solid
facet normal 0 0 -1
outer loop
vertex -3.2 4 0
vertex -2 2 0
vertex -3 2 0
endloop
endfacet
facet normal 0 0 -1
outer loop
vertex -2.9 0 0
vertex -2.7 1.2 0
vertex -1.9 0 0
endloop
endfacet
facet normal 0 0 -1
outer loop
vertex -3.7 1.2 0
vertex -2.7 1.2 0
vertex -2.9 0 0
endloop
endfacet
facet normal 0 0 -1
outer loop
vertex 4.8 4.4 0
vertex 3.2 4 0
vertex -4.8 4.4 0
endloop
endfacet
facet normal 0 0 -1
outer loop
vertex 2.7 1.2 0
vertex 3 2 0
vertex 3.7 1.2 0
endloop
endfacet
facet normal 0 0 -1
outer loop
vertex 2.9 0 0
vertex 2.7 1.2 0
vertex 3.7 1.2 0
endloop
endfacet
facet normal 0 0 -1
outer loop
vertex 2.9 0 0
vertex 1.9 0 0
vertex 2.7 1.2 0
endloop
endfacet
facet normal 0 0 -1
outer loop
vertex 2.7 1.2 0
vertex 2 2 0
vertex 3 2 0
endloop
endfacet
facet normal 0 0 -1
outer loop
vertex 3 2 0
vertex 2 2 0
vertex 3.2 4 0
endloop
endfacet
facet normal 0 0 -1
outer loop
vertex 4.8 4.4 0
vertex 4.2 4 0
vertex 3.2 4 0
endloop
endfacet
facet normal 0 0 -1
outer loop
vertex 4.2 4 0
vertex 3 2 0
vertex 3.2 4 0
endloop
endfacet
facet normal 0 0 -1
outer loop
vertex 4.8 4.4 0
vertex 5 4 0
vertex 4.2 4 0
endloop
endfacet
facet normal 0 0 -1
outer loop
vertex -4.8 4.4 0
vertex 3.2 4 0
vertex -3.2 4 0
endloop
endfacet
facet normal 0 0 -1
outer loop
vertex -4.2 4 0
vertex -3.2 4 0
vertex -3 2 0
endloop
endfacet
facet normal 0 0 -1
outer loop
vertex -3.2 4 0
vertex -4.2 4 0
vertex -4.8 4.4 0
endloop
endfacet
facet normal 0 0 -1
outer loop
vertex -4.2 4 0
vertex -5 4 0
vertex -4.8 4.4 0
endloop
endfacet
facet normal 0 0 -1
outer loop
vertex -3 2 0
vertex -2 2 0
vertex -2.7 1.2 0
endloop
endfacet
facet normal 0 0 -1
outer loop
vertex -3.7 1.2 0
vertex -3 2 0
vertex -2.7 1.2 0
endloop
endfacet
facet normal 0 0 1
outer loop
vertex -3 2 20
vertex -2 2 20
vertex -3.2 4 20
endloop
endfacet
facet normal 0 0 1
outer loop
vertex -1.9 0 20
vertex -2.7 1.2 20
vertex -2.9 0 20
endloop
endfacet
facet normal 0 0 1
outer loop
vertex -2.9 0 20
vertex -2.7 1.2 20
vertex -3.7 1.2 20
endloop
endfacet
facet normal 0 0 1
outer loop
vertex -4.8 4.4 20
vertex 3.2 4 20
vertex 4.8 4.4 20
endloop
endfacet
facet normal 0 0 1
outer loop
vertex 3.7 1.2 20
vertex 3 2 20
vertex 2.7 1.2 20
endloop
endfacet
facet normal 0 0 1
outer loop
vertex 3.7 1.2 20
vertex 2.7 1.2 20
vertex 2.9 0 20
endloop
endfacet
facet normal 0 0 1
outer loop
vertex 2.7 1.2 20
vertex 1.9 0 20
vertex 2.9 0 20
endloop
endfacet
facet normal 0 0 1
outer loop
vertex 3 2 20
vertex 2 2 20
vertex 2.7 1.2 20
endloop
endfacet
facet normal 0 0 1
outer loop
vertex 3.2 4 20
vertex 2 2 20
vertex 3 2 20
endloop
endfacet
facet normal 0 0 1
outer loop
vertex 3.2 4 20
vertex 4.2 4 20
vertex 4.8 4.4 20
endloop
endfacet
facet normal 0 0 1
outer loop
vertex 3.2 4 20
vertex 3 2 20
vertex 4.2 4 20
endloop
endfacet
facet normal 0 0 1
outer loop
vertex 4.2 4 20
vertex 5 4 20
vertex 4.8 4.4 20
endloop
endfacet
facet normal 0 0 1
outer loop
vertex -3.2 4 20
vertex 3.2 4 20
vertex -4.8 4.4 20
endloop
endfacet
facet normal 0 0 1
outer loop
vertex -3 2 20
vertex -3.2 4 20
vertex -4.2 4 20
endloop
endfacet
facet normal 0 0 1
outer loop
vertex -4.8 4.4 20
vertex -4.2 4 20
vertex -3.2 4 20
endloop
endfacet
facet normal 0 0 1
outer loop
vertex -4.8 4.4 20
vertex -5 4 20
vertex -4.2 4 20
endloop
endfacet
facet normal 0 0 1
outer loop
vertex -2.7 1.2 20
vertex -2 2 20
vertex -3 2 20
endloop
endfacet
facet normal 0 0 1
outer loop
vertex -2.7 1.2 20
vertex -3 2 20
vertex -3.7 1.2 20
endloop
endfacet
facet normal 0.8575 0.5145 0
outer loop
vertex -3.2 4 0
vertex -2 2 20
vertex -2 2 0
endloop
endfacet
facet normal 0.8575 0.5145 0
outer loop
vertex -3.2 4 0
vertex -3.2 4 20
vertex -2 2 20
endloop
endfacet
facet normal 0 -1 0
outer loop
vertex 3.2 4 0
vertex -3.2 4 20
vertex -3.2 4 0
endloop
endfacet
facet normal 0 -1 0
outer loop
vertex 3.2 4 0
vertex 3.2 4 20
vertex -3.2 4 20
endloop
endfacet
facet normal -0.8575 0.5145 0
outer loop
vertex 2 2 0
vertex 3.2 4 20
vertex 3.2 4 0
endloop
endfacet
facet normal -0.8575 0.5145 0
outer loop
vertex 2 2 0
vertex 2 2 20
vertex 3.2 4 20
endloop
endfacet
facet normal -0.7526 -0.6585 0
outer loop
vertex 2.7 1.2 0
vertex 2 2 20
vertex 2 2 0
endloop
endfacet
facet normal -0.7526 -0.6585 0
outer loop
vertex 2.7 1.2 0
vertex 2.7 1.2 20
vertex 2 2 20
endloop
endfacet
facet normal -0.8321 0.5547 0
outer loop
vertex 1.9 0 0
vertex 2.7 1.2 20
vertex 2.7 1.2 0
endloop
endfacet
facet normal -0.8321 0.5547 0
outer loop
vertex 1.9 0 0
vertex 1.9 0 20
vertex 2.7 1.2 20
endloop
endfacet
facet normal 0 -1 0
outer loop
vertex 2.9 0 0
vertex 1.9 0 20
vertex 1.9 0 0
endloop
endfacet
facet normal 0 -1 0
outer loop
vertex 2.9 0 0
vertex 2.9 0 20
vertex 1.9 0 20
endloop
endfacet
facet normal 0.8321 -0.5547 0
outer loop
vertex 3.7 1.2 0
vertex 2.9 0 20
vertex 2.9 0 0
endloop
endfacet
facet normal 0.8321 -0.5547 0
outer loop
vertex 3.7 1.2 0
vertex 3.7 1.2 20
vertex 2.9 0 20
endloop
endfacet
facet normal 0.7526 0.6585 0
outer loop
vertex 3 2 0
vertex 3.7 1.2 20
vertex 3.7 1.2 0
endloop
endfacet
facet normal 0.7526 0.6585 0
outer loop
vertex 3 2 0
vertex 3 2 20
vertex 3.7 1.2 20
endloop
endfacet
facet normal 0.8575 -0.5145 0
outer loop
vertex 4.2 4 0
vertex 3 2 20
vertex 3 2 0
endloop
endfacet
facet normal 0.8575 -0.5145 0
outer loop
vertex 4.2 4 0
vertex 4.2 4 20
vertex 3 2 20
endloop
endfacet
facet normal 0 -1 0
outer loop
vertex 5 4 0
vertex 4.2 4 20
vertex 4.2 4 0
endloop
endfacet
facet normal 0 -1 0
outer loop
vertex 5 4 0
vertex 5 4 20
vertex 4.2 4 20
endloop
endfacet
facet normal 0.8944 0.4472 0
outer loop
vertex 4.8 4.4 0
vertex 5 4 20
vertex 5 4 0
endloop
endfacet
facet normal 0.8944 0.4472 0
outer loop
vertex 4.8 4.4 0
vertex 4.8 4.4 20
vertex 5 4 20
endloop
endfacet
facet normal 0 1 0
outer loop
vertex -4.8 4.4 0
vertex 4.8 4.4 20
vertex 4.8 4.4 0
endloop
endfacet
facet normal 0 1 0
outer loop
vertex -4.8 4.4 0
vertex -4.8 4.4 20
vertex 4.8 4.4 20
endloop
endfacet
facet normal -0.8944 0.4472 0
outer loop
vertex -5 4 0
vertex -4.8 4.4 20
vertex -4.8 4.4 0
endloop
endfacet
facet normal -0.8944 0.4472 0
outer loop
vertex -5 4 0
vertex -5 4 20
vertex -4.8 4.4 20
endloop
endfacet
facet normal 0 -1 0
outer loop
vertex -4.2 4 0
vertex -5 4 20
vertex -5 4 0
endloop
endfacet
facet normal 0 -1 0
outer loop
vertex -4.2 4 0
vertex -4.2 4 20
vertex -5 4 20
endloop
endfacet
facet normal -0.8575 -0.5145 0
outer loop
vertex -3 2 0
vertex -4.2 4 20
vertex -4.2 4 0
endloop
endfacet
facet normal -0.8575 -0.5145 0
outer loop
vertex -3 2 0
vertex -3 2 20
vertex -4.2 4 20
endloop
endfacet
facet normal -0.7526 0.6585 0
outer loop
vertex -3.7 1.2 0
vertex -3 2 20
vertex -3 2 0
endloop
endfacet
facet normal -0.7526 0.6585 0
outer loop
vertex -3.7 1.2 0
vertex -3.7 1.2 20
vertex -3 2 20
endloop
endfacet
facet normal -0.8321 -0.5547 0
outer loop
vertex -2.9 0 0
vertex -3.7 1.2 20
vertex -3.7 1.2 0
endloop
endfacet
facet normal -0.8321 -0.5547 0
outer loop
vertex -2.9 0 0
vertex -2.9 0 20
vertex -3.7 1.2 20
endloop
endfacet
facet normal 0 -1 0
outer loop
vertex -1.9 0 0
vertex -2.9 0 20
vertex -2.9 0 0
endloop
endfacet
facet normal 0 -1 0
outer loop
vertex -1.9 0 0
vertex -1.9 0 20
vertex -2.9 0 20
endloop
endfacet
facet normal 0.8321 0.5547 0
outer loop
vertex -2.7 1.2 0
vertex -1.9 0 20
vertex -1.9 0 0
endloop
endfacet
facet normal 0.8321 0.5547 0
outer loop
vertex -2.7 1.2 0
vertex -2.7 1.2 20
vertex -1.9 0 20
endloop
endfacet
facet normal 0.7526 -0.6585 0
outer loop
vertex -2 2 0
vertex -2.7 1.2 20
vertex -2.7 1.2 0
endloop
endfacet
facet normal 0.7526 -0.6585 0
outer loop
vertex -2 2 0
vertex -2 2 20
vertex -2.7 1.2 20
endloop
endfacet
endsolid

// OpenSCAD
length = 20; // [3:0.1:500]

// conver extension on one side
// leave it 0 (zero) if you don't need it
side_extension_width = 0; // [0:0.1:20]

/* HIDDEN */
side_add_w = side_extension_width;

$fn=1*60;

top2_w = 1*9.6;
top_w = 1*10; // 9.2 -v2> 9.6 -v3> 10
w1 = 1*8.4;
w2 = 1*6;
w3 = 1*7.4; // 8 -v2> 7.4
bottom_w = 1*5.8;

h1 = 1*4; // 3.8 -v4> 4.0
h2 = 1*2;
h3 = 1*1.2;
h_top_cover = 1*0.4;

wall_thick = 1; // 
tb_thick = 0; // top-bottom thickness 0.8 -v3> 0.4 -v4> 0

// MAIN

//rotate([-90,0,0])
linear_extrude(height = length) {
	difference() {
		polygon(points=[[-bottom_w/2, 0],
						[-w3/2, h3],
						[-w2/2, h2],
						[-w1/2, h1],
						[-top_w/2, h1],
						[-top2_w/2, h1 + h_top_cover],
						[top2_w/2 + side_add_w, h1 + h_top_cover],
						[top_w/2 + side_add_w, h1],
						[w1/2, h1],
						[w2/2, h2],
						[w3/2, h3],
						[bottom_w/2, 0]]);

		polygon(points=[[-bottom_w/2 + wall_thick, tb_thick],
						[-w3/2 + wall_thick, h3],
						[-w2/2 + wall_thick, h2],
						[-w1/2 + wall_thick, h1],
						[w1/2 - wall_thick, h1],
						[w2/2 - wall_thick, h2],
						[w3/2 - wall_thick, h3],
						[bottom_w/2 - wall_thick, tb_thick]]);
	}			
		
}
